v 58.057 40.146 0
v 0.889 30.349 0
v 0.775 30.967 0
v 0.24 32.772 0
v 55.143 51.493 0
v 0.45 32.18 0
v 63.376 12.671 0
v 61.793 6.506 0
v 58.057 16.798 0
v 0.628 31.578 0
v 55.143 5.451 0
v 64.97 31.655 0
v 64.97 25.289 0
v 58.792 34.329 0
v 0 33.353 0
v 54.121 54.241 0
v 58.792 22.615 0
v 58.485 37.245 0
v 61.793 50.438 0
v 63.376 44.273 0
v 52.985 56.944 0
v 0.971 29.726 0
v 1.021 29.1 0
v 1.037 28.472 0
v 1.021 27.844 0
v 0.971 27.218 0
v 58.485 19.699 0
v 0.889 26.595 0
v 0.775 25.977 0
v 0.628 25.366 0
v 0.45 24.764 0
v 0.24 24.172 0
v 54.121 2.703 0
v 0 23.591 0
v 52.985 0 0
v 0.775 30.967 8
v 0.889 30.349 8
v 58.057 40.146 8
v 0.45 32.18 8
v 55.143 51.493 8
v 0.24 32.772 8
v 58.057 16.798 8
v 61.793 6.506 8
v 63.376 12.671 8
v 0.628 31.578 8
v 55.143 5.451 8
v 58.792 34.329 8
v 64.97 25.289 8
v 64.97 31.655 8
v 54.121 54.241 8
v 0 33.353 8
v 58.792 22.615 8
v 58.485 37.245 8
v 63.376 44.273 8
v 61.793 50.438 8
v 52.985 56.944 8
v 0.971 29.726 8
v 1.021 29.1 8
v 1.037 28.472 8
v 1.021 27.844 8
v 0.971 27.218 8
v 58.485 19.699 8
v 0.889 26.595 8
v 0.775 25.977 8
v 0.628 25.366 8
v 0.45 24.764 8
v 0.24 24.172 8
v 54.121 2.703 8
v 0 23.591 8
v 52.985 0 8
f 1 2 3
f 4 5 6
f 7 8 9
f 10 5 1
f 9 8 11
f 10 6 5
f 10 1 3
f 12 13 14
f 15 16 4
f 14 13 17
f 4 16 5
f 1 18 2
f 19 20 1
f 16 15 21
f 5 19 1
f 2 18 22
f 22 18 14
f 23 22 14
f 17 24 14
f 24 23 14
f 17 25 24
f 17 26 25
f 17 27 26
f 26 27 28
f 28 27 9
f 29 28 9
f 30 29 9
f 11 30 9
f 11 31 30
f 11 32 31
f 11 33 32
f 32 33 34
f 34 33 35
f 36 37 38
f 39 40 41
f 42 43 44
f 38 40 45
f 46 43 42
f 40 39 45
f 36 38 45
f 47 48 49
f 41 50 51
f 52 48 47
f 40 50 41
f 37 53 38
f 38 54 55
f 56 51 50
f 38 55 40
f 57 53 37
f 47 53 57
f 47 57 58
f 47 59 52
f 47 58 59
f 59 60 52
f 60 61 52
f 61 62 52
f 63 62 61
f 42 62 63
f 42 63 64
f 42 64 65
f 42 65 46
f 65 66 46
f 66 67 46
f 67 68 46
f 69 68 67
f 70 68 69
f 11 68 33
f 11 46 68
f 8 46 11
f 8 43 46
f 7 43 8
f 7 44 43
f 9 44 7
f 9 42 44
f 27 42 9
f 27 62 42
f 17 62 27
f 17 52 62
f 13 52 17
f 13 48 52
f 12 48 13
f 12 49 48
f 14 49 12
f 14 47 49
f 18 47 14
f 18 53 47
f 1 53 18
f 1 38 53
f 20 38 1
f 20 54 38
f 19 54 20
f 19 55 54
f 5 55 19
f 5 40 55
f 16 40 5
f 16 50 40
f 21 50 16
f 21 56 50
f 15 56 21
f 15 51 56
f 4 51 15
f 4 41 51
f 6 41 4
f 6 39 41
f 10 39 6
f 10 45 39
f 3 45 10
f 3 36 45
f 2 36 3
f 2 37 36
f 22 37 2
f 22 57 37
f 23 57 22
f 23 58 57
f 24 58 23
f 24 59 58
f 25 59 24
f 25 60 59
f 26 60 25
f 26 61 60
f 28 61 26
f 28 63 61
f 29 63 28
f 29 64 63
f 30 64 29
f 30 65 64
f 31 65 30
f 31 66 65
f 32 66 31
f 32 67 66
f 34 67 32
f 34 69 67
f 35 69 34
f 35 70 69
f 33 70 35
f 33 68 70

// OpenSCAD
$fn = 32;

// ----------------------------------------------------------------------
// Gear sector: 3 teeth on 48 degrees
// ----------------------------------------------------------------------

// --- parameters (mm) ---
sector_angle = 48;        // sector angle, degrees
root_r = 70;              // root circle radius
tooth_h = 6;              // tooth height over the root circle
teeth = 3;                // number of teeth on the sector
hub_r = 12;               // hub bore radius
plate_t = 8;              // sector thickness, Z
arc_step = 3;             // sampling step of the root/hub arcs, degrees

tip_r = root_r + tooth_h;  // tip circle radius

profile = [[52.985, 0], [54.121, 2.703], [55.143, 5.451], [61.793, 6.506], [63.376, 12.671], [58.057, 16.798], [58.485, 19.699], [58.792, 22.615], [64.97, 25.289], [64.97, 31.655], [58.792, 34.329], [58.485, 37.245], [58.057, 40.146], [63.376, 44.273], [61.793, 50.438], [55.143, 51.493], [54.121, 54.241], [52.985, 56.944], [0, 33.353], [0.24, 32.772], [0.45, 32.18], [0.628, 31.578], [0.775, 30.967], [0.889, 30.349], [0.971, 29.726], [1.021, 29.1], [1.037, 28.472], [1.021, 27.844], [0.971, 27.218], [0.889, 26.595], [0.775, 25.977], [0.628, 25.366], [0.45, 24.764], [0.24, 24.172], [0, 23.591]];  // primary outline, 35 points, counter clockwise

// --- the one profile operation ---
linear_extrude(height = plate_t) polygon(points = profile);
